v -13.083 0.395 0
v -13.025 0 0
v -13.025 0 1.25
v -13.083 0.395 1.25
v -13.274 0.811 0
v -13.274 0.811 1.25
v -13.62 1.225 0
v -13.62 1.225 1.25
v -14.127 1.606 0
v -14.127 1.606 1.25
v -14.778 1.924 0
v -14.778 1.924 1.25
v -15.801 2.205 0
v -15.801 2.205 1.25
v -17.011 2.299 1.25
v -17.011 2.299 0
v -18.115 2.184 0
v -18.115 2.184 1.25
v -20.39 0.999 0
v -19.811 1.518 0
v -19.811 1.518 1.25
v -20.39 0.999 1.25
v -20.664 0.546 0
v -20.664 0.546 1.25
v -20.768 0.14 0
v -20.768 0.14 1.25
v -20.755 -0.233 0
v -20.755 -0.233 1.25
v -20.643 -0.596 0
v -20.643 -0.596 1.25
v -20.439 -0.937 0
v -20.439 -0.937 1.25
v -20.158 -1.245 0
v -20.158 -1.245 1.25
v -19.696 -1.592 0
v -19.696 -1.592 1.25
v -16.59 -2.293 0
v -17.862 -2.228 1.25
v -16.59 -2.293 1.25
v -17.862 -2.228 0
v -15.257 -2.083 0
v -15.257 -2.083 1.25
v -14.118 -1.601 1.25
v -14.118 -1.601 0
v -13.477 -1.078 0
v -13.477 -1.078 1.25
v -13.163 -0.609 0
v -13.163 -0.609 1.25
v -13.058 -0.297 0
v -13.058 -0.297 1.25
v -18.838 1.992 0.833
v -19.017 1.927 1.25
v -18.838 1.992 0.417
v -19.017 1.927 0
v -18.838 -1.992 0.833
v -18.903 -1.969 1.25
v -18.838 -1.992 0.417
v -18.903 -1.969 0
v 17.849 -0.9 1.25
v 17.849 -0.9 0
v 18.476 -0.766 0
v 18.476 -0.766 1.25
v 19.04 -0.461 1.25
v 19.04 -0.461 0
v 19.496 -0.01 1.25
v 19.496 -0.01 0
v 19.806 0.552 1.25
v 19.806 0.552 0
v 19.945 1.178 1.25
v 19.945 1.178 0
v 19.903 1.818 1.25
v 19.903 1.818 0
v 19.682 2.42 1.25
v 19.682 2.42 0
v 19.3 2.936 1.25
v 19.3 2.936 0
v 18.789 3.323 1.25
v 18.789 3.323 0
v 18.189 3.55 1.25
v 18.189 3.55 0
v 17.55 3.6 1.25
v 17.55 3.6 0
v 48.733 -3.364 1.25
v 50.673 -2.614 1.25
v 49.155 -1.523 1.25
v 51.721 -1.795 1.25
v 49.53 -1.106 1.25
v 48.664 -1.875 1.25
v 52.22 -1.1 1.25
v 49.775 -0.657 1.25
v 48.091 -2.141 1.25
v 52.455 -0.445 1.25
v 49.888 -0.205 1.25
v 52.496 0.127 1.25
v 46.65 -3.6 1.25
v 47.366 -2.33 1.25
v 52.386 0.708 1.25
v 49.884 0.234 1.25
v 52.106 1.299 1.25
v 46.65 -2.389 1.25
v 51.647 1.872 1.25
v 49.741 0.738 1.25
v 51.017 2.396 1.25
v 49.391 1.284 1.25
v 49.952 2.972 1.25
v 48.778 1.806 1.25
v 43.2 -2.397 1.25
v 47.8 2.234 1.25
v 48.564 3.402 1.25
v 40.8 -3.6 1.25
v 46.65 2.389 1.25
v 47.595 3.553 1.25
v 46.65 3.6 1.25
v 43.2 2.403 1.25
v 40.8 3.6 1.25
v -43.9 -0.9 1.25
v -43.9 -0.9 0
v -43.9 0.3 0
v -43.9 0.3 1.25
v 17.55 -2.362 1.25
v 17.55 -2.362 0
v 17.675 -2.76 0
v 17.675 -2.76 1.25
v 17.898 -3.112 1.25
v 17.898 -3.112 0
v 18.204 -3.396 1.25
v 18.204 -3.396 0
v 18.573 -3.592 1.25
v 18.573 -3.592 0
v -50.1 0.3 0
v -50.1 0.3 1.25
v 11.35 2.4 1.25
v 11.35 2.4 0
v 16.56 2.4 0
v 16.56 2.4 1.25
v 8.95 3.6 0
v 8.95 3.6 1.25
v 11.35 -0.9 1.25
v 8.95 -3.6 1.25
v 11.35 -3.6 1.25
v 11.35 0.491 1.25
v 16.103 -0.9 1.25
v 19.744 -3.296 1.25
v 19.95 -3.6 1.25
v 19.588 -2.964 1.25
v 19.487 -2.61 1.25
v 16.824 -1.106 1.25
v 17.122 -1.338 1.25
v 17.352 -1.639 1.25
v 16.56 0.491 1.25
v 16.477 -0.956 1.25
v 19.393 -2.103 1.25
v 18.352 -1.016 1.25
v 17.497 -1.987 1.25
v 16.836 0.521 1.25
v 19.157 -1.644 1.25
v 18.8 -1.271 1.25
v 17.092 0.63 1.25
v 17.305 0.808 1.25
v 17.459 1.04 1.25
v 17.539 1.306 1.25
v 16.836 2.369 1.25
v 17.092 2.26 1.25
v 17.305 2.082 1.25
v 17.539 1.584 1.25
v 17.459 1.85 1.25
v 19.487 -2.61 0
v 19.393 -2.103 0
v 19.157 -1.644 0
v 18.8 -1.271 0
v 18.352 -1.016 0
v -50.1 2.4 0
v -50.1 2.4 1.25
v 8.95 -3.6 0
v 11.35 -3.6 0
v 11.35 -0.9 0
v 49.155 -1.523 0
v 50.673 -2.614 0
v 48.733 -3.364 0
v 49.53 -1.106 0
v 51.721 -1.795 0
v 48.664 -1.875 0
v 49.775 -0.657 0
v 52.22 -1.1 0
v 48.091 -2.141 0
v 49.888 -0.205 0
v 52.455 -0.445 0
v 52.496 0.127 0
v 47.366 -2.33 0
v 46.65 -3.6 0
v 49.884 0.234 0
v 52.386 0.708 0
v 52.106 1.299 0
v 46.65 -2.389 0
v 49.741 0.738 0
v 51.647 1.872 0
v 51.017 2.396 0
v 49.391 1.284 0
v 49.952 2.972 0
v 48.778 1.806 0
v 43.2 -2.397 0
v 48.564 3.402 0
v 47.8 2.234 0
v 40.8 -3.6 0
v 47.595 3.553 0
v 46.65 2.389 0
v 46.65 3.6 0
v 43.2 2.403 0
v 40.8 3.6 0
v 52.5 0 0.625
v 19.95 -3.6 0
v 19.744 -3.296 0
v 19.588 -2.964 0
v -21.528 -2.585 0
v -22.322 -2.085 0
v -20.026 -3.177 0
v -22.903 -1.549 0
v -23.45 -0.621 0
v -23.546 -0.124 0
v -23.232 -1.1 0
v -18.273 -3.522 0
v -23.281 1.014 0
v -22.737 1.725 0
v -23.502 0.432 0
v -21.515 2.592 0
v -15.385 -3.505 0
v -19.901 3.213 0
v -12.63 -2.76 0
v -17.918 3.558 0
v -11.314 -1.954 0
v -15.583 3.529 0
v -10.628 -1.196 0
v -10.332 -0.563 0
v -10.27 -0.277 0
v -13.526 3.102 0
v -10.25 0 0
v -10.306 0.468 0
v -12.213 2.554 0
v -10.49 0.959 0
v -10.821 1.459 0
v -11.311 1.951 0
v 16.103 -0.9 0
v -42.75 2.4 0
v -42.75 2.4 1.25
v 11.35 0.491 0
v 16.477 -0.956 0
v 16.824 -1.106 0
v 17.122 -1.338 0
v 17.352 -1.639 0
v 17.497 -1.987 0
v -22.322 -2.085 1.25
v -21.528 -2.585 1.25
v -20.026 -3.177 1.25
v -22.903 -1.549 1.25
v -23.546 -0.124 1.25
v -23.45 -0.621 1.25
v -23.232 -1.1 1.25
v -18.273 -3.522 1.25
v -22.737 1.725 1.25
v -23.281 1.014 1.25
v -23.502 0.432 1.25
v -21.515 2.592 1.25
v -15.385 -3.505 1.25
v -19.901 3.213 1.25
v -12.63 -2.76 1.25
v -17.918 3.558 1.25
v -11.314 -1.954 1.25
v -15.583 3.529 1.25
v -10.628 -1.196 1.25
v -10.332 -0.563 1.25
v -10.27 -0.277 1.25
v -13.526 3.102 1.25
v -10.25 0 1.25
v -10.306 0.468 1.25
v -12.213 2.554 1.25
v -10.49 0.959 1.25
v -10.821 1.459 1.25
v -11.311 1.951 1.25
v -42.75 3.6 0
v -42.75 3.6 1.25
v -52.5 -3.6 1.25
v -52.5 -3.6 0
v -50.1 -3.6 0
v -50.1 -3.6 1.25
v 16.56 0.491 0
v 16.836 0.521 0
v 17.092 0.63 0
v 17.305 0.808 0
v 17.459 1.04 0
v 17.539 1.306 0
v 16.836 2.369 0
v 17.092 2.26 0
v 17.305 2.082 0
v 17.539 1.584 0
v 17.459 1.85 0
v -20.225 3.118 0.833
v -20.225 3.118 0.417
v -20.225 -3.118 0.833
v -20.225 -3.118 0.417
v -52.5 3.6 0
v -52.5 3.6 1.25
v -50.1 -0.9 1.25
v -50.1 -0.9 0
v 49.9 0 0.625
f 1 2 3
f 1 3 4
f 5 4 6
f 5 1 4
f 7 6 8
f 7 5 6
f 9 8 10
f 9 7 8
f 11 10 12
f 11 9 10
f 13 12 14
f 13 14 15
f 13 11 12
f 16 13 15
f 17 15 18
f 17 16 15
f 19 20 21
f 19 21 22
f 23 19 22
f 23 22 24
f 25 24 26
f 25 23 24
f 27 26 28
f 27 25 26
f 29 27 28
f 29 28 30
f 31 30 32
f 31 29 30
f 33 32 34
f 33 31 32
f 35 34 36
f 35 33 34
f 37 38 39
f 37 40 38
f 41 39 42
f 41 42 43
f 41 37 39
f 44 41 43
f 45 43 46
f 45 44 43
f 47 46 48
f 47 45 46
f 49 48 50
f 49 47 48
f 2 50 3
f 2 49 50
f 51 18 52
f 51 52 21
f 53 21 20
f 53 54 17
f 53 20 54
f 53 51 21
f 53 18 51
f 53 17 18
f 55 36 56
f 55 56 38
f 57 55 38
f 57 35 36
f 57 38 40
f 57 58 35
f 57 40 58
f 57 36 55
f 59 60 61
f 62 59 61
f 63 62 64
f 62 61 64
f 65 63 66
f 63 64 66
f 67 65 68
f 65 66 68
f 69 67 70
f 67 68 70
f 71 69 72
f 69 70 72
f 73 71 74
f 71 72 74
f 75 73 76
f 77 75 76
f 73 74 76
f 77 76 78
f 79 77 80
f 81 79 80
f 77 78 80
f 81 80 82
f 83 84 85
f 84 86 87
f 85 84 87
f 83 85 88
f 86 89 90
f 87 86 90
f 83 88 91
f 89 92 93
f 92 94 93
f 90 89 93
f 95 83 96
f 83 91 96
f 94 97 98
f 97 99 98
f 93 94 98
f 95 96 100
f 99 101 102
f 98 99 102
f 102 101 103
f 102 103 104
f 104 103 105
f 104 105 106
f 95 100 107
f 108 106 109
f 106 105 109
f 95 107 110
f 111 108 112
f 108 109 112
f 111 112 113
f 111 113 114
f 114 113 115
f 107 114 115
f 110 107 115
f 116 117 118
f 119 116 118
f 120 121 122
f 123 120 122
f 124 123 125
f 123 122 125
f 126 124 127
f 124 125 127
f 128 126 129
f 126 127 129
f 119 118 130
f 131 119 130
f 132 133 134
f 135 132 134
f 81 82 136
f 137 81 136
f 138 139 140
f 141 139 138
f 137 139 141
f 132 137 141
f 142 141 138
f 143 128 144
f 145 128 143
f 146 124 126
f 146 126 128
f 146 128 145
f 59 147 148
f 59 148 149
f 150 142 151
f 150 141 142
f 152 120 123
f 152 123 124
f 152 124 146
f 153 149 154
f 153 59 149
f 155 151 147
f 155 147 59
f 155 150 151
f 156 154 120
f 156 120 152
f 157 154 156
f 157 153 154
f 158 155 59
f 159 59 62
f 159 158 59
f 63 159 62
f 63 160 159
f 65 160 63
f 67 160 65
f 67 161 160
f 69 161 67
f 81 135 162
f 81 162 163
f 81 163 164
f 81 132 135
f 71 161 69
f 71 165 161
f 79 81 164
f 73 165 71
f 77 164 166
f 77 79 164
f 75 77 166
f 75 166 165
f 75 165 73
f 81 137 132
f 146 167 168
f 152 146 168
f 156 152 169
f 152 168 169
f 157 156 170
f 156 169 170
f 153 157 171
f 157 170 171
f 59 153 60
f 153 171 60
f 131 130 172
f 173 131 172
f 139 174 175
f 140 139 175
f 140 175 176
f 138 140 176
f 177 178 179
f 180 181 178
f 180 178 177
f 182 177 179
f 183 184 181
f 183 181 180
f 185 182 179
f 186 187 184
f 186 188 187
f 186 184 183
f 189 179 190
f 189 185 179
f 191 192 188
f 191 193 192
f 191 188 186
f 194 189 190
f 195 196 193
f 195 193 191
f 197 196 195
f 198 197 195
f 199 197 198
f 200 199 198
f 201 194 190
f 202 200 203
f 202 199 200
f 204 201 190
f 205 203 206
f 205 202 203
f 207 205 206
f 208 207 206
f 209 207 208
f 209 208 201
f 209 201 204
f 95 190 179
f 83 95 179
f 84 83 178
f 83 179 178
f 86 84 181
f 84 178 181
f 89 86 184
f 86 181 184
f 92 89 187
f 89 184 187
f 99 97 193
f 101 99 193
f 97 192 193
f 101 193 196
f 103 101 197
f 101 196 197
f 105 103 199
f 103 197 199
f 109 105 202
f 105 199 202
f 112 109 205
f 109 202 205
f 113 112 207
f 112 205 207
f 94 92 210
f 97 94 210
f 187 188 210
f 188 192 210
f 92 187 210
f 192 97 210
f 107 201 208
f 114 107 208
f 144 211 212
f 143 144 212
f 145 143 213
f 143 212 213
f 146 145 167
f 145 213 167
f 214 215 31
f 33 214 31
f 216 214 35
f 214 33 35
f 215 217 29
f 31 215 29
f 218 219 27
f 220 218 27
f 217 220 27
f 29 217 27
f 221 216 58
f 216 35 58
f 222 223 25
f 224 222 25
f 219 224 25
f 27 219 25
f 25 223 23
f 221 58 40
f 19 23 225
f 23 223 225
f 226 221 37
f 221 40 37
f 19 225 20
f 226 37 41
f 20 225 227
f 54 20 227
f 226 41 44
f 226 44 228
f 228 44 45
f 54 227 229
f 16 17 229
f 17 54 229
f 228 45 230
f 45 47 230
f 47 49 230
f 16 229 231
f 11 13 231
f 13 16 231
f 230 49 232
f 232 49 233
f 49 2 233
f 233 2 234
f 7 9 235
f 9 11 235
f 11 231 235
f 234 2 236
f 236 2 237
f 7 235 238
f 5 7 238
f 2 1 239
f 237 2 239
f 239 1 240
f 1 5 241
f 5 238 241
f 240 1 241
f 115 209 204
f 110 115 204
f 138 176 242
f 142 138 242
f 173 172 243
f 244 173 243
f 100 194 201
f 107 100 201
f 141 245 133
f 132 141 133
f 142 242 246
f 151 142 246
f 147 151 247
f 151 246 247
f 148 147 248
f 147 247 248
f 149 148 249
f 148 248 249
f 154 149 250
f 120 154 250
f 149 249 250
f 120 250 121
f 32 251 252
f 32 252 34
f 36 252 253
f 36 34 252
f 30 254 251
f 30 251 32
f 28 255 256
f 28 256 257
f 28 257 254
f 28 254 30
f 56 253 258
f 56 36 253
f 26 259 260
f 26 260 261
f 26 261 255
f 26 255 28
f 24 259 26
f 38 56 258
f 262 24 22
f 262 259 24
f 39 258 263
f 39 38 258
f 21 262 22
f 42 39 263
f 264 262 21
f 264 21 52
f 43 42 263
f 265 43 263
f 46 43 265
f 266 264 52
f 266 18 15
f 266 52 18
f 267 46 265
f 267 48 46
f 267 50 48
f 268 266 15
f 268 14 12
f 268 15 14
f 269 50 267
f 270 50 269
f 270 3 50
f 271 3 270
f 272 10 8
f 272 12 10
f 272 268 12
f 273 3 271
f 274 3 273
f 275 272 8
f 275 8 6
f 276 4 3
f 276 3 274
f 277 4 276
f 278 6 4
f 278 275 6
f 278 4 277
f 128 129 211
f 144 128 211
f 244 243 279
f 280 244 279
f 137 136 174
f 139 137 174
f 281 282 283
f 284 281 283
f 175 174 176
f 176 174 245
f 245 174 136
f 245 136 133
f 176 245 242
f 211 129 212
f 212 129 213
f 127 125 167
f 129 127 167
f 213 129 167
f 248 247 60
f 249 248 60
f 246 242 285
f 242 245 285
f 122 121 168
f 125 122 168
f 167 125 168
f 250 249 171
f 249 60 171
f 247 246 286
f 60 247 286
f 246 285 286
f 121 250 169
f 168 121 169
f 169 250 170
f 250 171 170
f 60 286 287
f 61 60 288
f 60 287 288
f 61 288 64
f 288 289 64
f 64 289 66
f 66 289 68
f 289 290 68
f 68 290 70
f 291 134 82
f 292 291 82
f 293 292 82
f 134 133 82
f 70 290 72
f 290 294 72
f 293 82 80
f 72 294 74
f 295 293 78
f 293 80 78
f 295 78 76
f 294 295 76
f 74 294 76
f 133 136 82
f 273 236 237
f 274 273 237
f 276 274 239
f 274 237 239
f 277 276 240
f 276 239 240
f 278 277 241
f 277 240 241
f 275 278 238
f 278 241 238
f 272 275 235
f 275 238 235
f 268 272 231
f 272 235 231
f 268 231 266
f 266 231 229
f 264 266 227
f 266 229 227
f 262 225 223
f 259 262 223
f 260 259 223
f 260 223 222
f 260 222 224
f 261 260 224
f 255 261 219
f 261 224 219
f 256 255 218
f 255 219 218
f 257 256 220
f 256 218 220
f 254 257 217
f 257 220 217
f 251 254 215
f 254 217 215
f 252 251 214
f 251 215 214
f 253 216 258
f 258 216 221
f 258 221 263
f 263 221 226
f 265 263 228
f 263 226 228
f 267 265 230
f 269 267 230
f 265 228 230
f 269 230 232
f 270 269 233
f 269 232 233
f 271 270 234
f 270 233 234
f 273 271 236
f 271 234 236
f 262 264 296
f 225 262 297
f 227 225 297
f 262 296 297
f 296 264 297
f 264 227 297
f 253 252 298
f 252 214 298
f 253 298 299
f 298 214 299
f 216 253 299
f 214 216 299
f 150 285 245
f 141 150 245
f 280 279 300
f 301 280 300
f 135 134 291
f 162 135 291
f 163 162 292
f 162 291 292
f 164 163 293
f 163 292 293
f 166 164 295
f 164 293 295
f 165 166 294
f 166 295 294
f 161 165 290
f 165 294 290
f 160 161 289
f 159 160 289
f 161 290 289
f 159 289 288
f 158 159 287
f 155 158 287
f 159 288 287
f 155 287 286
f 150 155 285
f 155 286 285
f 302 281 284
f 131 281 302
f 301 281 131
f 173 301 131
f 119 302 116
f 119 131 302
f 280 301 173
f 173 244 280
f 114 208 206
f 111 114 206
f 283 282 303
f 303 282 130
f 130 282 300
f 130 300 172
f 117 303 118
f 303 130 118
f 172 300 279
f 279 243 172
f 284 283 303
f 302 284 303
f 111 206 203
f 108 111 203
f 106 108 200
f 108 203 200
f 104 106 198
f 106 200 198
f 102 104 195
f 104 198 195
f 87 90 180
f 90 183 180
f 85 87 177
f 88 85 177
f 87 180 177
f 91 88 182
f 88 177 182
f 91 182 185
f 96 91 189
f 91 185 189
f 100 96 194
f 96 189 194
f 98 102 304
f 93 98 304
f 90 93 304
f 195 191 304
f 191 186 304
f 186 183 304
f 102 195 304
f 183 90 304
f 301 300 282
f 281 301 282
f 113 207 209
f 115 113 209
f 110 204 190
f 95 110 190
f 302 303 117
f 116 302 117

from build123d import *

# Parameters (mm, degrees)
F5_DEPTH  = 1.25
F7_DEPTH  = 1.25
F9_DEPTH  = 1.25
F11_DEPTH = 1.25


with BuildPart() as f5:
    # F4 (on face) → F5 (new body)
    with BuildSketch(Plane.XY):
        with BuildLine():
            add(Edge.make_bspline(
                [(40.8, 0), (40.8, -3.6), (46.65, -3.6)],
                knots=[3.1415926536, 3.1415926536, 3.1415926536, 4.7123889804, 4.7123889804, 4.7123889804], degree=2, weights=[1, 0.7071067812, 1]))
            Line((40.8, 0), (40.8, -3.6))
            Line((40.8, -3.6), (46.65, -3.6))
        make_face()
        with BuildLine():
            Line((46.65, 3.6), (40.8, 3.6))
            Line((40.8, 3.6), (40.8, 0))
            add(Edge.make_bspline(
                [(46.65, 3.6), (40.8, 3.6), (40.8, 0)],
                knots=[1.5707963268, 1.5707963268, 1.5707963268, 3.1415926536, 3.1415926536, 3.1415926536], degree=2, weights=[1, 0.7071067812, 1]))
        make_face()
        with BuildLine():
            add(Edge.make_bspline(
                [(46.65, 3.6), (40.8, 3.6), (40.8, 0)],
                knots=[1.5707963268, 1.5707963268, 1.5707963268, 3.1415926536, 3.1415926536, 3.1415926536], degree=2, weights=[1, 0.7071067812, 1]))
            Line((40.8, 0), (43.2, 0))
            Line((43.2, 0), (43.2, 2.4032108641))
            Line((43.2, 2.4032108641), (46.65, 2.3890721108))
            add(Edge.make_bspline(
                [(49.9, 0), (49.9, 2.3890721108), (46.65, 2.3890721108)],
                knots=[0, 0, 0, 1.5707963268, 1.5707963268, 1.5707963268], degree=2, weights=[1, 0.7071067812, 1]))
            Line((49.9, 0), (52.5, 0))
            add(Edge.make_bspline(
                [(52.5, 0), (52.5, 3.6), (46.65, 3.6)],
                knots=[0, 0, 0, 1.5707963268, 1.5707963268, 1.5707963268], degree=2, weights=[1, 0.7071067812, 1]))
        make_face()
        with BuildLine():
            Line((43.2, 0), (40.8, 0))
            add(Edge.make_bspline(
                [(40.8, 0), (40.8, -3.6), (46.65, -3.6)],
                knots=[3.1415926536, 3.1415926536, 3.1415926536, 4.7123889804, 4.7123889804, 4.7123889804], degree=2, weights=[1, 0.7071067812, 1]))
            add(Edge.make_bspline(
                [(46.65, -3.6), (52.5, -3.6), (52.5, 0)],
                knots=[4.7123889804, 4.7123889804, 4.7123889804, 6.2831853072, 6.2831853072, 6.2831853072], degree=2, weights=[1, 0.7071067812, 1]))
            Line((52.5, 0), (49.9, 0))
            add(Edge.make_bspline(
                [(46.65, -2.3890721108), (49.9, -2.3890721108), (49.9, 0)],
                knots=[4.7123889804, 4.7123889804, 4.7123889804, 6.2831853072, 6.2831853072, 6.2831853072], degree=2, weights=[1, 0.7071067812, 1]))
            Line((46.65, -2.3890721108), (43.2, -2.3967891359))
            Line((43.2, -2.3967891359), (43.2, 0))
        make_face()
    extrude(amount=F5_DEPTH)


with BuildPart() as f7:
    # F6 (on Top) → F7 (new body)
    with BuildSketch(Plane.XY):
        with BuildLine():
            Line((8.9499597691, 3.6), (8.9499597691, -3.6))
            Line((8.9499597691, -3.6), (11.3499597691, -3.6))
            Line((11.3499597691, -3.6), (11.3499597691, -0.9))
            Line((11.3499597691, -0.9), (16.1034110934, -0.9))
            ThreePointArc((16.1034110934, -0.9), (17.1223055925, -1.3382469801), (17.5499597691, -2.3616326948))
            ThreePointArc((17.5499597691, -2.3616326948), (17.8983445143, -3.1123077967), (18.5728613287, -3.5917993048))
            Line((18.5728613287, -3.5917993048), (19.9499597691, -3.6))
            ThreePointArc((19.9499597691, -3.6), (19.6592603152, -3.1329832996), (19.4874741137, -2.6103933342))
            ThreePointArc((19.4874741137, -2.6103933342), (18.9921508408, -1.4446820248), (17.8488101046, -0.8997049955))
            ThreePointArc((17.8488101046, -0.8997049955), (19.9470176311, 1.4994252406), (17.5499597691, 3.6))
            Line((17.5499597691, 3.6), (8.9499597691, 3.6))
        make_face()
        with BuildLine():
            ThreePointArc((17.5499597691, -0.9), (17.6993787617, -0.8935968227), (17.8488101046, -0.8997049955))
            ThreePointArc((17.8488101046, -0.8997049955), (17.6993898297, -0.9048091144), (17.5499597691, -0.9))
        make_face(mode=Mode.SUBTRACT)
        with BuildLine():
            Line((16.5599597691, 0.4905831765), (11.3499597691, 0.4905831765))
            Line((11.3499597691, 0.4905831765), (11.3499597691, 2.4))
            Line((11.3499597691, 2.4), (16.5599597691, 2.4))
            ThreePointArc((16.5599597691, 2.4), (17.5489298202, 1.4452915883), (16.5599597691, 0.4905831765))
        make_face(mode=Mode.SUBTRACT)
        with BuildLine():
            ThreePointArc((17.5499597691, -0.9), (17.6993898297, -0.9048091144), (17.8488101046, -0.8997049955))
            ThreePointArc((17.8488101046, -0.8997049955), (17.6993787617, -0.8935968227), (17.5499597691, -0.9))
        make_face()
    extrude(amount=F7_DEPTH)


with BuildPart() as f9:
    # F8 (on Top) → F9 (new body)
    with BuildSketch(Plane.XY):
        with BuildLine():
            add(Edge.make_bspline(
                [(-10.25, 0), (-10.25, 6.2353829072), (-20.225, 3.1176914536), (-30.2, 0), (-20.225, -3.1176914536), (-10.25, -6.2353829072), (-10.25, 0)],
                knots=[0, 0, 0, 2.0943951024, 2.0943951024, 4.1887902048, 4.1887902048, 6.2831853072, 6.2831853072, 6.2831853072], degree=2, weights=[1, 0.5, 1, 0.5, 1, 0.5, 1]))
        make_face()
        with BuildLine():
            add(Edge.make_bspline(
                [(-13.025, 0), (-13.025, 3.9837168574), (-18.8375, 1.9918584287), (-24.65, 0), (-18.8375, -1.9918584287), (-13.025, -3.9837168574), (-13.025, 0)],
                knots=[0, 0, 0, 2.0943951024, 2.0943951024, 4.1887902048, 4.1887902048, 6.2831853072, 6.2831853072, 6.2831853072], degree=2, weights=[1, 0.5, 1, 0.5, 1, 0.5, 1]))
        make_face(mode=Mode.SUBTRACT)
    extrude(amount=F9_DEPTH)


with BuildPart() as f11:
    # F10 (on Top) → F11 (new body)
    with BuildSketch(Plane.XY):
        Polygon((-42.75, 3.6), (-52.5, 3.6), (-52.5, -3.6), (-50.1, -3.6), (-50.1, -0.9), (-43.9, -0.9), (-43.9, 0.3), (-50.1, 0.3), (-50.1, 2.4), (-42.75, 2.4), align=None)
    extrude(amount=F11_DEPTH)


solid = Compound([f5.part, f7.part, f9.part, f11.part])
